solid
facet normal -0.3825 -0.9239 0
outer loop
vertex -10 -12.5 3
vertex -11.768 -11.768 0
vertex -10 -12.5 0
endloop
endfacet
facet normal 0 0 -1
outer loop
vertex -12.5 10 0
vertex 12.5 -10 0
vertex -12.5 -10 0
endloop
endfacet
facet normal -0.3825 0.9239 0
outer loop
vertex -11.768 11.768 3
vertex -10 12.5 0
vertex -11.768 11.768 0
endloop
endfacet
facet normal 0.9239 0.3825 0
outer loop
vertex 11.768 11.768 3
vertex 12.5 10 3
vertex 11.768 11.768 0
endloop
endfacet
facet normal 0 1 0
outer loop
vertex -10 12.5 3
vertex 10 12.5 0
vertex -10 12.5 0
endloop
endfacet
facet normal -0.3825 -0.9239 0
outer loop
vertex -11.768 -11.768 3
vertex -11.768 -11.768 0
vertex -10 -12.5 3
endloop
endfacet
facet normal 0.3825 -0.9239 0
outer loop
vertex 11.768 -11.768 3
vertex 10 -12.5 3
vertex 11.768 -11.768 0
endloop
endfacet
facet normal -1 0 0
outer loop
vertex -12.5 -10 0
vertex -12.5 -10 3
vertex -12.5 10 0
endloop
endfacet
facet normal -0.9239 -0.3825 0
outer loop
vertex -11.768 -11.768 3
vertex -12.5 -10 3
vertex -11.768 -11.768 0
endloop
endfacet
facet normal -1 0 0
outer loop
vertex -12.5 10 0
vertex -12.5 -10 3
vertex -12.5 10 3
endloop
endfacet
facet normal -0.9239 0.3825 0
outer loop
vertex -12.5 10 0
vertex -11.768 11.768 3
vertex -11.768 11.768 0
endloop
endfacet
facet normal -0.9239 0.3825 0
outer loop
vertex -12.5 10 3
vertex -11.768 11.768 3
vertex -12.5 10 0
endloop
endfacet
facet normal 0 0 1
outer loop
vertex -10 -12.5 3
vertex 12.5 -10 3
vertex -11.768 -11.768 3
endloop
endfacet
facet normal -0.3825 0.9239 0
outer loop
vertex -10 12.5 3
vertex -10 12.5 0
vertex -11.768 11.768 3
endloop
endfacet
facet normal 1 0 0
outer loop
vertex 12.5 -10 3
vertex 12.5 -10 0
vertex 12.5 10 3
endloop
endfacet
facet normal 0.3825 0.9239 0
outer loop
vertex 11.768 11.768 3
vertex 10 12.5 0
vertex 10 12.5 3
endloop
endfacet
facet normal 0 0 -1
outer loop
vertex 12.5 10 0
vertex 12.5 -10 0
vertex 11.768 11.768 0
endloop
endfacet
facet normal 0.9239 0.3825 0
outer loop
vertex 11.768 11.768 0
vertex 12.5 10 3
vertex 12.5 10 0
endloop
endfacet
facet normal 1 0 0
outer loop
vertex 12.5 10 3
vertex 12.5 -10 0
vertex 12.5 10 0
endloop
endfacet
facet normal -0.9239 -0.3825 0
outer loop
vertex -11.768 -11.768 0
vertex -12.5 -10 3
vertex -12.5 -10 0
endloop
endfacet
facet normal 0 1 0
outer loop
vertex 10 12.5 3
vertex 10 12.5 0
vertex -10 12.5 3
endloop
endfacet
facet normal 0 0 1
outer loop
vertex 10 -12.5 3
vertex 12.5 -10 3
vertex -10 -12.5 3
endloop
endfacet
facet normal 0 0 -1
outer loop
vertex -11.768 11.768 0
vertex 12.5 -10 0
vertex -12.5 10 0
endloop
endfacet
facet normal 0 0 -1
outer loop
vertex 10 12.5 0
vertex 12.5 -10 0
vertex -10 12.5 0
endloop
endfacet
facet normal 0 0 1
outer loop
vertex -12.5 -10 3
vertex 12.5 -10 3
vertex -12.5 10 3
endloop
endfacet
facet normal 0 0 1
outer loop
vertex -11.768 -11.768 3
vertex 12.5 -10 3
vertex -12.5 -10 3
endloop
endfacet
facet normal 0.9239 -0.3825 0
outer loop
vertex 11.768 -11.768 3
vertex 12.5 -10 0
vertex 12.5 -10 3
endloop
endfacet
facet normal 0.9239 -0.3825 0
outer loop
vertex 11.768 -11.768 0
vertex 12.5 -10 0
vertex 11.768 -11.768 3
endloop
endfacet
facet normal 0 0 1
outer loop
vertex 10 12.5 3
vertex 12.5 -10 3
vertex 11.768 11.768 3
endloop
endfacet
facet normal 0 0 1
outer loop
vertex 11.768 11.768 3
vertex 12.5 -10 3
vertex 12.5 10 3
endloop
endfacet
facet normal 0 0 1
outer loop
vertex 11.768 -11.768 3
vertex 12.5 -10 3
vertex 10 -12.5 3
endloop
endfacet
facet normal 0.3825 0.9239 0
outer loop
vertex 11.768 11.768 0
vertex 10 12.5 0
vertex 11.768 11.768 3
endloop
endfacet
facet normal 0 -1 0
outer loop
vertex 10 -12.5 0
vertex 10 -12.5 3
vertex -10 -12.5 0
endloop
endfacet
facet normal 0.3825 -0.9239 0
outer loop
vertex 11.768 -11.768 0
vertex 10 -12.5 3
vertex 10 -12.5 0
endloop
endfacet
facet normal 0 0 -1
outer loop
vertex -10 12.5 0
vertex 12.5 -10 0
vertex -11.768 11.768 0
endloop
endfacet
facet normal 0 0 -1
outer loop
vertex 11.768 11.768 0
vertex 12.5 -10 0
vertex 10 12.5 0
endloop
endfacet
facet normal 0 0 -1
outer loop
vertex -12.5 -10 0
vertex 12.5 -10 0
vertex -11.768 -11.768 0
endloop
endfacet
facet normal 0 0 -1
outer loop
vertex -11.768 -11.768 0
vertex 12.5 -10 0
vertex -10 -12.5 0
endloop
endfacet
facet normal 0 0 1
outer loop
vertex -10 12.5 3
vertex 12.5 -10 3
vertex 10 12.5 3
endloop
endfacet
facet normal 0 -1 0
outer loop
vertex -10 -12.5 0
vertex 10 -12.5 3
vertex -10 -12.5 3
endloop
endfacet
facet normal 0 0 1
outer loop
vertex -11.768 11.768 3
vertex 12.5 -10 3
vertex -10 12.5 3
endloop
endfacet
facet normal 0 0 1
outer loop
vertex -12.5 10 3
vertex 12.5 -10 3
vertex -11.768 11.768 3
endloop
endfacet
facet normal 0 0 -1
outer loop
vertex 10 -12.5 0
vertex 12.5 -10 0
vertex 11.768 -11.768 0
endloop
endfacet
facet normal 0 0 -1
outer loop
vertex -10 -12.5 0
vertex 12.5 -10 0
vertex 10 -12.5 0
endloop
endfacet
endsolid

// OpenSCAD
r = 2.5;

hull() corners([10, 10], o=r) cylinder(3, r=r);

module corners(dimensions=[1,1], o=0) {
    x = dimensions[0];
    y = dimensions[1];
  
    translate([-x, y]) children();
    translate([x, y]) children();
    translate([-x, -y]) children();
    translate([x, -y]) children();
}
